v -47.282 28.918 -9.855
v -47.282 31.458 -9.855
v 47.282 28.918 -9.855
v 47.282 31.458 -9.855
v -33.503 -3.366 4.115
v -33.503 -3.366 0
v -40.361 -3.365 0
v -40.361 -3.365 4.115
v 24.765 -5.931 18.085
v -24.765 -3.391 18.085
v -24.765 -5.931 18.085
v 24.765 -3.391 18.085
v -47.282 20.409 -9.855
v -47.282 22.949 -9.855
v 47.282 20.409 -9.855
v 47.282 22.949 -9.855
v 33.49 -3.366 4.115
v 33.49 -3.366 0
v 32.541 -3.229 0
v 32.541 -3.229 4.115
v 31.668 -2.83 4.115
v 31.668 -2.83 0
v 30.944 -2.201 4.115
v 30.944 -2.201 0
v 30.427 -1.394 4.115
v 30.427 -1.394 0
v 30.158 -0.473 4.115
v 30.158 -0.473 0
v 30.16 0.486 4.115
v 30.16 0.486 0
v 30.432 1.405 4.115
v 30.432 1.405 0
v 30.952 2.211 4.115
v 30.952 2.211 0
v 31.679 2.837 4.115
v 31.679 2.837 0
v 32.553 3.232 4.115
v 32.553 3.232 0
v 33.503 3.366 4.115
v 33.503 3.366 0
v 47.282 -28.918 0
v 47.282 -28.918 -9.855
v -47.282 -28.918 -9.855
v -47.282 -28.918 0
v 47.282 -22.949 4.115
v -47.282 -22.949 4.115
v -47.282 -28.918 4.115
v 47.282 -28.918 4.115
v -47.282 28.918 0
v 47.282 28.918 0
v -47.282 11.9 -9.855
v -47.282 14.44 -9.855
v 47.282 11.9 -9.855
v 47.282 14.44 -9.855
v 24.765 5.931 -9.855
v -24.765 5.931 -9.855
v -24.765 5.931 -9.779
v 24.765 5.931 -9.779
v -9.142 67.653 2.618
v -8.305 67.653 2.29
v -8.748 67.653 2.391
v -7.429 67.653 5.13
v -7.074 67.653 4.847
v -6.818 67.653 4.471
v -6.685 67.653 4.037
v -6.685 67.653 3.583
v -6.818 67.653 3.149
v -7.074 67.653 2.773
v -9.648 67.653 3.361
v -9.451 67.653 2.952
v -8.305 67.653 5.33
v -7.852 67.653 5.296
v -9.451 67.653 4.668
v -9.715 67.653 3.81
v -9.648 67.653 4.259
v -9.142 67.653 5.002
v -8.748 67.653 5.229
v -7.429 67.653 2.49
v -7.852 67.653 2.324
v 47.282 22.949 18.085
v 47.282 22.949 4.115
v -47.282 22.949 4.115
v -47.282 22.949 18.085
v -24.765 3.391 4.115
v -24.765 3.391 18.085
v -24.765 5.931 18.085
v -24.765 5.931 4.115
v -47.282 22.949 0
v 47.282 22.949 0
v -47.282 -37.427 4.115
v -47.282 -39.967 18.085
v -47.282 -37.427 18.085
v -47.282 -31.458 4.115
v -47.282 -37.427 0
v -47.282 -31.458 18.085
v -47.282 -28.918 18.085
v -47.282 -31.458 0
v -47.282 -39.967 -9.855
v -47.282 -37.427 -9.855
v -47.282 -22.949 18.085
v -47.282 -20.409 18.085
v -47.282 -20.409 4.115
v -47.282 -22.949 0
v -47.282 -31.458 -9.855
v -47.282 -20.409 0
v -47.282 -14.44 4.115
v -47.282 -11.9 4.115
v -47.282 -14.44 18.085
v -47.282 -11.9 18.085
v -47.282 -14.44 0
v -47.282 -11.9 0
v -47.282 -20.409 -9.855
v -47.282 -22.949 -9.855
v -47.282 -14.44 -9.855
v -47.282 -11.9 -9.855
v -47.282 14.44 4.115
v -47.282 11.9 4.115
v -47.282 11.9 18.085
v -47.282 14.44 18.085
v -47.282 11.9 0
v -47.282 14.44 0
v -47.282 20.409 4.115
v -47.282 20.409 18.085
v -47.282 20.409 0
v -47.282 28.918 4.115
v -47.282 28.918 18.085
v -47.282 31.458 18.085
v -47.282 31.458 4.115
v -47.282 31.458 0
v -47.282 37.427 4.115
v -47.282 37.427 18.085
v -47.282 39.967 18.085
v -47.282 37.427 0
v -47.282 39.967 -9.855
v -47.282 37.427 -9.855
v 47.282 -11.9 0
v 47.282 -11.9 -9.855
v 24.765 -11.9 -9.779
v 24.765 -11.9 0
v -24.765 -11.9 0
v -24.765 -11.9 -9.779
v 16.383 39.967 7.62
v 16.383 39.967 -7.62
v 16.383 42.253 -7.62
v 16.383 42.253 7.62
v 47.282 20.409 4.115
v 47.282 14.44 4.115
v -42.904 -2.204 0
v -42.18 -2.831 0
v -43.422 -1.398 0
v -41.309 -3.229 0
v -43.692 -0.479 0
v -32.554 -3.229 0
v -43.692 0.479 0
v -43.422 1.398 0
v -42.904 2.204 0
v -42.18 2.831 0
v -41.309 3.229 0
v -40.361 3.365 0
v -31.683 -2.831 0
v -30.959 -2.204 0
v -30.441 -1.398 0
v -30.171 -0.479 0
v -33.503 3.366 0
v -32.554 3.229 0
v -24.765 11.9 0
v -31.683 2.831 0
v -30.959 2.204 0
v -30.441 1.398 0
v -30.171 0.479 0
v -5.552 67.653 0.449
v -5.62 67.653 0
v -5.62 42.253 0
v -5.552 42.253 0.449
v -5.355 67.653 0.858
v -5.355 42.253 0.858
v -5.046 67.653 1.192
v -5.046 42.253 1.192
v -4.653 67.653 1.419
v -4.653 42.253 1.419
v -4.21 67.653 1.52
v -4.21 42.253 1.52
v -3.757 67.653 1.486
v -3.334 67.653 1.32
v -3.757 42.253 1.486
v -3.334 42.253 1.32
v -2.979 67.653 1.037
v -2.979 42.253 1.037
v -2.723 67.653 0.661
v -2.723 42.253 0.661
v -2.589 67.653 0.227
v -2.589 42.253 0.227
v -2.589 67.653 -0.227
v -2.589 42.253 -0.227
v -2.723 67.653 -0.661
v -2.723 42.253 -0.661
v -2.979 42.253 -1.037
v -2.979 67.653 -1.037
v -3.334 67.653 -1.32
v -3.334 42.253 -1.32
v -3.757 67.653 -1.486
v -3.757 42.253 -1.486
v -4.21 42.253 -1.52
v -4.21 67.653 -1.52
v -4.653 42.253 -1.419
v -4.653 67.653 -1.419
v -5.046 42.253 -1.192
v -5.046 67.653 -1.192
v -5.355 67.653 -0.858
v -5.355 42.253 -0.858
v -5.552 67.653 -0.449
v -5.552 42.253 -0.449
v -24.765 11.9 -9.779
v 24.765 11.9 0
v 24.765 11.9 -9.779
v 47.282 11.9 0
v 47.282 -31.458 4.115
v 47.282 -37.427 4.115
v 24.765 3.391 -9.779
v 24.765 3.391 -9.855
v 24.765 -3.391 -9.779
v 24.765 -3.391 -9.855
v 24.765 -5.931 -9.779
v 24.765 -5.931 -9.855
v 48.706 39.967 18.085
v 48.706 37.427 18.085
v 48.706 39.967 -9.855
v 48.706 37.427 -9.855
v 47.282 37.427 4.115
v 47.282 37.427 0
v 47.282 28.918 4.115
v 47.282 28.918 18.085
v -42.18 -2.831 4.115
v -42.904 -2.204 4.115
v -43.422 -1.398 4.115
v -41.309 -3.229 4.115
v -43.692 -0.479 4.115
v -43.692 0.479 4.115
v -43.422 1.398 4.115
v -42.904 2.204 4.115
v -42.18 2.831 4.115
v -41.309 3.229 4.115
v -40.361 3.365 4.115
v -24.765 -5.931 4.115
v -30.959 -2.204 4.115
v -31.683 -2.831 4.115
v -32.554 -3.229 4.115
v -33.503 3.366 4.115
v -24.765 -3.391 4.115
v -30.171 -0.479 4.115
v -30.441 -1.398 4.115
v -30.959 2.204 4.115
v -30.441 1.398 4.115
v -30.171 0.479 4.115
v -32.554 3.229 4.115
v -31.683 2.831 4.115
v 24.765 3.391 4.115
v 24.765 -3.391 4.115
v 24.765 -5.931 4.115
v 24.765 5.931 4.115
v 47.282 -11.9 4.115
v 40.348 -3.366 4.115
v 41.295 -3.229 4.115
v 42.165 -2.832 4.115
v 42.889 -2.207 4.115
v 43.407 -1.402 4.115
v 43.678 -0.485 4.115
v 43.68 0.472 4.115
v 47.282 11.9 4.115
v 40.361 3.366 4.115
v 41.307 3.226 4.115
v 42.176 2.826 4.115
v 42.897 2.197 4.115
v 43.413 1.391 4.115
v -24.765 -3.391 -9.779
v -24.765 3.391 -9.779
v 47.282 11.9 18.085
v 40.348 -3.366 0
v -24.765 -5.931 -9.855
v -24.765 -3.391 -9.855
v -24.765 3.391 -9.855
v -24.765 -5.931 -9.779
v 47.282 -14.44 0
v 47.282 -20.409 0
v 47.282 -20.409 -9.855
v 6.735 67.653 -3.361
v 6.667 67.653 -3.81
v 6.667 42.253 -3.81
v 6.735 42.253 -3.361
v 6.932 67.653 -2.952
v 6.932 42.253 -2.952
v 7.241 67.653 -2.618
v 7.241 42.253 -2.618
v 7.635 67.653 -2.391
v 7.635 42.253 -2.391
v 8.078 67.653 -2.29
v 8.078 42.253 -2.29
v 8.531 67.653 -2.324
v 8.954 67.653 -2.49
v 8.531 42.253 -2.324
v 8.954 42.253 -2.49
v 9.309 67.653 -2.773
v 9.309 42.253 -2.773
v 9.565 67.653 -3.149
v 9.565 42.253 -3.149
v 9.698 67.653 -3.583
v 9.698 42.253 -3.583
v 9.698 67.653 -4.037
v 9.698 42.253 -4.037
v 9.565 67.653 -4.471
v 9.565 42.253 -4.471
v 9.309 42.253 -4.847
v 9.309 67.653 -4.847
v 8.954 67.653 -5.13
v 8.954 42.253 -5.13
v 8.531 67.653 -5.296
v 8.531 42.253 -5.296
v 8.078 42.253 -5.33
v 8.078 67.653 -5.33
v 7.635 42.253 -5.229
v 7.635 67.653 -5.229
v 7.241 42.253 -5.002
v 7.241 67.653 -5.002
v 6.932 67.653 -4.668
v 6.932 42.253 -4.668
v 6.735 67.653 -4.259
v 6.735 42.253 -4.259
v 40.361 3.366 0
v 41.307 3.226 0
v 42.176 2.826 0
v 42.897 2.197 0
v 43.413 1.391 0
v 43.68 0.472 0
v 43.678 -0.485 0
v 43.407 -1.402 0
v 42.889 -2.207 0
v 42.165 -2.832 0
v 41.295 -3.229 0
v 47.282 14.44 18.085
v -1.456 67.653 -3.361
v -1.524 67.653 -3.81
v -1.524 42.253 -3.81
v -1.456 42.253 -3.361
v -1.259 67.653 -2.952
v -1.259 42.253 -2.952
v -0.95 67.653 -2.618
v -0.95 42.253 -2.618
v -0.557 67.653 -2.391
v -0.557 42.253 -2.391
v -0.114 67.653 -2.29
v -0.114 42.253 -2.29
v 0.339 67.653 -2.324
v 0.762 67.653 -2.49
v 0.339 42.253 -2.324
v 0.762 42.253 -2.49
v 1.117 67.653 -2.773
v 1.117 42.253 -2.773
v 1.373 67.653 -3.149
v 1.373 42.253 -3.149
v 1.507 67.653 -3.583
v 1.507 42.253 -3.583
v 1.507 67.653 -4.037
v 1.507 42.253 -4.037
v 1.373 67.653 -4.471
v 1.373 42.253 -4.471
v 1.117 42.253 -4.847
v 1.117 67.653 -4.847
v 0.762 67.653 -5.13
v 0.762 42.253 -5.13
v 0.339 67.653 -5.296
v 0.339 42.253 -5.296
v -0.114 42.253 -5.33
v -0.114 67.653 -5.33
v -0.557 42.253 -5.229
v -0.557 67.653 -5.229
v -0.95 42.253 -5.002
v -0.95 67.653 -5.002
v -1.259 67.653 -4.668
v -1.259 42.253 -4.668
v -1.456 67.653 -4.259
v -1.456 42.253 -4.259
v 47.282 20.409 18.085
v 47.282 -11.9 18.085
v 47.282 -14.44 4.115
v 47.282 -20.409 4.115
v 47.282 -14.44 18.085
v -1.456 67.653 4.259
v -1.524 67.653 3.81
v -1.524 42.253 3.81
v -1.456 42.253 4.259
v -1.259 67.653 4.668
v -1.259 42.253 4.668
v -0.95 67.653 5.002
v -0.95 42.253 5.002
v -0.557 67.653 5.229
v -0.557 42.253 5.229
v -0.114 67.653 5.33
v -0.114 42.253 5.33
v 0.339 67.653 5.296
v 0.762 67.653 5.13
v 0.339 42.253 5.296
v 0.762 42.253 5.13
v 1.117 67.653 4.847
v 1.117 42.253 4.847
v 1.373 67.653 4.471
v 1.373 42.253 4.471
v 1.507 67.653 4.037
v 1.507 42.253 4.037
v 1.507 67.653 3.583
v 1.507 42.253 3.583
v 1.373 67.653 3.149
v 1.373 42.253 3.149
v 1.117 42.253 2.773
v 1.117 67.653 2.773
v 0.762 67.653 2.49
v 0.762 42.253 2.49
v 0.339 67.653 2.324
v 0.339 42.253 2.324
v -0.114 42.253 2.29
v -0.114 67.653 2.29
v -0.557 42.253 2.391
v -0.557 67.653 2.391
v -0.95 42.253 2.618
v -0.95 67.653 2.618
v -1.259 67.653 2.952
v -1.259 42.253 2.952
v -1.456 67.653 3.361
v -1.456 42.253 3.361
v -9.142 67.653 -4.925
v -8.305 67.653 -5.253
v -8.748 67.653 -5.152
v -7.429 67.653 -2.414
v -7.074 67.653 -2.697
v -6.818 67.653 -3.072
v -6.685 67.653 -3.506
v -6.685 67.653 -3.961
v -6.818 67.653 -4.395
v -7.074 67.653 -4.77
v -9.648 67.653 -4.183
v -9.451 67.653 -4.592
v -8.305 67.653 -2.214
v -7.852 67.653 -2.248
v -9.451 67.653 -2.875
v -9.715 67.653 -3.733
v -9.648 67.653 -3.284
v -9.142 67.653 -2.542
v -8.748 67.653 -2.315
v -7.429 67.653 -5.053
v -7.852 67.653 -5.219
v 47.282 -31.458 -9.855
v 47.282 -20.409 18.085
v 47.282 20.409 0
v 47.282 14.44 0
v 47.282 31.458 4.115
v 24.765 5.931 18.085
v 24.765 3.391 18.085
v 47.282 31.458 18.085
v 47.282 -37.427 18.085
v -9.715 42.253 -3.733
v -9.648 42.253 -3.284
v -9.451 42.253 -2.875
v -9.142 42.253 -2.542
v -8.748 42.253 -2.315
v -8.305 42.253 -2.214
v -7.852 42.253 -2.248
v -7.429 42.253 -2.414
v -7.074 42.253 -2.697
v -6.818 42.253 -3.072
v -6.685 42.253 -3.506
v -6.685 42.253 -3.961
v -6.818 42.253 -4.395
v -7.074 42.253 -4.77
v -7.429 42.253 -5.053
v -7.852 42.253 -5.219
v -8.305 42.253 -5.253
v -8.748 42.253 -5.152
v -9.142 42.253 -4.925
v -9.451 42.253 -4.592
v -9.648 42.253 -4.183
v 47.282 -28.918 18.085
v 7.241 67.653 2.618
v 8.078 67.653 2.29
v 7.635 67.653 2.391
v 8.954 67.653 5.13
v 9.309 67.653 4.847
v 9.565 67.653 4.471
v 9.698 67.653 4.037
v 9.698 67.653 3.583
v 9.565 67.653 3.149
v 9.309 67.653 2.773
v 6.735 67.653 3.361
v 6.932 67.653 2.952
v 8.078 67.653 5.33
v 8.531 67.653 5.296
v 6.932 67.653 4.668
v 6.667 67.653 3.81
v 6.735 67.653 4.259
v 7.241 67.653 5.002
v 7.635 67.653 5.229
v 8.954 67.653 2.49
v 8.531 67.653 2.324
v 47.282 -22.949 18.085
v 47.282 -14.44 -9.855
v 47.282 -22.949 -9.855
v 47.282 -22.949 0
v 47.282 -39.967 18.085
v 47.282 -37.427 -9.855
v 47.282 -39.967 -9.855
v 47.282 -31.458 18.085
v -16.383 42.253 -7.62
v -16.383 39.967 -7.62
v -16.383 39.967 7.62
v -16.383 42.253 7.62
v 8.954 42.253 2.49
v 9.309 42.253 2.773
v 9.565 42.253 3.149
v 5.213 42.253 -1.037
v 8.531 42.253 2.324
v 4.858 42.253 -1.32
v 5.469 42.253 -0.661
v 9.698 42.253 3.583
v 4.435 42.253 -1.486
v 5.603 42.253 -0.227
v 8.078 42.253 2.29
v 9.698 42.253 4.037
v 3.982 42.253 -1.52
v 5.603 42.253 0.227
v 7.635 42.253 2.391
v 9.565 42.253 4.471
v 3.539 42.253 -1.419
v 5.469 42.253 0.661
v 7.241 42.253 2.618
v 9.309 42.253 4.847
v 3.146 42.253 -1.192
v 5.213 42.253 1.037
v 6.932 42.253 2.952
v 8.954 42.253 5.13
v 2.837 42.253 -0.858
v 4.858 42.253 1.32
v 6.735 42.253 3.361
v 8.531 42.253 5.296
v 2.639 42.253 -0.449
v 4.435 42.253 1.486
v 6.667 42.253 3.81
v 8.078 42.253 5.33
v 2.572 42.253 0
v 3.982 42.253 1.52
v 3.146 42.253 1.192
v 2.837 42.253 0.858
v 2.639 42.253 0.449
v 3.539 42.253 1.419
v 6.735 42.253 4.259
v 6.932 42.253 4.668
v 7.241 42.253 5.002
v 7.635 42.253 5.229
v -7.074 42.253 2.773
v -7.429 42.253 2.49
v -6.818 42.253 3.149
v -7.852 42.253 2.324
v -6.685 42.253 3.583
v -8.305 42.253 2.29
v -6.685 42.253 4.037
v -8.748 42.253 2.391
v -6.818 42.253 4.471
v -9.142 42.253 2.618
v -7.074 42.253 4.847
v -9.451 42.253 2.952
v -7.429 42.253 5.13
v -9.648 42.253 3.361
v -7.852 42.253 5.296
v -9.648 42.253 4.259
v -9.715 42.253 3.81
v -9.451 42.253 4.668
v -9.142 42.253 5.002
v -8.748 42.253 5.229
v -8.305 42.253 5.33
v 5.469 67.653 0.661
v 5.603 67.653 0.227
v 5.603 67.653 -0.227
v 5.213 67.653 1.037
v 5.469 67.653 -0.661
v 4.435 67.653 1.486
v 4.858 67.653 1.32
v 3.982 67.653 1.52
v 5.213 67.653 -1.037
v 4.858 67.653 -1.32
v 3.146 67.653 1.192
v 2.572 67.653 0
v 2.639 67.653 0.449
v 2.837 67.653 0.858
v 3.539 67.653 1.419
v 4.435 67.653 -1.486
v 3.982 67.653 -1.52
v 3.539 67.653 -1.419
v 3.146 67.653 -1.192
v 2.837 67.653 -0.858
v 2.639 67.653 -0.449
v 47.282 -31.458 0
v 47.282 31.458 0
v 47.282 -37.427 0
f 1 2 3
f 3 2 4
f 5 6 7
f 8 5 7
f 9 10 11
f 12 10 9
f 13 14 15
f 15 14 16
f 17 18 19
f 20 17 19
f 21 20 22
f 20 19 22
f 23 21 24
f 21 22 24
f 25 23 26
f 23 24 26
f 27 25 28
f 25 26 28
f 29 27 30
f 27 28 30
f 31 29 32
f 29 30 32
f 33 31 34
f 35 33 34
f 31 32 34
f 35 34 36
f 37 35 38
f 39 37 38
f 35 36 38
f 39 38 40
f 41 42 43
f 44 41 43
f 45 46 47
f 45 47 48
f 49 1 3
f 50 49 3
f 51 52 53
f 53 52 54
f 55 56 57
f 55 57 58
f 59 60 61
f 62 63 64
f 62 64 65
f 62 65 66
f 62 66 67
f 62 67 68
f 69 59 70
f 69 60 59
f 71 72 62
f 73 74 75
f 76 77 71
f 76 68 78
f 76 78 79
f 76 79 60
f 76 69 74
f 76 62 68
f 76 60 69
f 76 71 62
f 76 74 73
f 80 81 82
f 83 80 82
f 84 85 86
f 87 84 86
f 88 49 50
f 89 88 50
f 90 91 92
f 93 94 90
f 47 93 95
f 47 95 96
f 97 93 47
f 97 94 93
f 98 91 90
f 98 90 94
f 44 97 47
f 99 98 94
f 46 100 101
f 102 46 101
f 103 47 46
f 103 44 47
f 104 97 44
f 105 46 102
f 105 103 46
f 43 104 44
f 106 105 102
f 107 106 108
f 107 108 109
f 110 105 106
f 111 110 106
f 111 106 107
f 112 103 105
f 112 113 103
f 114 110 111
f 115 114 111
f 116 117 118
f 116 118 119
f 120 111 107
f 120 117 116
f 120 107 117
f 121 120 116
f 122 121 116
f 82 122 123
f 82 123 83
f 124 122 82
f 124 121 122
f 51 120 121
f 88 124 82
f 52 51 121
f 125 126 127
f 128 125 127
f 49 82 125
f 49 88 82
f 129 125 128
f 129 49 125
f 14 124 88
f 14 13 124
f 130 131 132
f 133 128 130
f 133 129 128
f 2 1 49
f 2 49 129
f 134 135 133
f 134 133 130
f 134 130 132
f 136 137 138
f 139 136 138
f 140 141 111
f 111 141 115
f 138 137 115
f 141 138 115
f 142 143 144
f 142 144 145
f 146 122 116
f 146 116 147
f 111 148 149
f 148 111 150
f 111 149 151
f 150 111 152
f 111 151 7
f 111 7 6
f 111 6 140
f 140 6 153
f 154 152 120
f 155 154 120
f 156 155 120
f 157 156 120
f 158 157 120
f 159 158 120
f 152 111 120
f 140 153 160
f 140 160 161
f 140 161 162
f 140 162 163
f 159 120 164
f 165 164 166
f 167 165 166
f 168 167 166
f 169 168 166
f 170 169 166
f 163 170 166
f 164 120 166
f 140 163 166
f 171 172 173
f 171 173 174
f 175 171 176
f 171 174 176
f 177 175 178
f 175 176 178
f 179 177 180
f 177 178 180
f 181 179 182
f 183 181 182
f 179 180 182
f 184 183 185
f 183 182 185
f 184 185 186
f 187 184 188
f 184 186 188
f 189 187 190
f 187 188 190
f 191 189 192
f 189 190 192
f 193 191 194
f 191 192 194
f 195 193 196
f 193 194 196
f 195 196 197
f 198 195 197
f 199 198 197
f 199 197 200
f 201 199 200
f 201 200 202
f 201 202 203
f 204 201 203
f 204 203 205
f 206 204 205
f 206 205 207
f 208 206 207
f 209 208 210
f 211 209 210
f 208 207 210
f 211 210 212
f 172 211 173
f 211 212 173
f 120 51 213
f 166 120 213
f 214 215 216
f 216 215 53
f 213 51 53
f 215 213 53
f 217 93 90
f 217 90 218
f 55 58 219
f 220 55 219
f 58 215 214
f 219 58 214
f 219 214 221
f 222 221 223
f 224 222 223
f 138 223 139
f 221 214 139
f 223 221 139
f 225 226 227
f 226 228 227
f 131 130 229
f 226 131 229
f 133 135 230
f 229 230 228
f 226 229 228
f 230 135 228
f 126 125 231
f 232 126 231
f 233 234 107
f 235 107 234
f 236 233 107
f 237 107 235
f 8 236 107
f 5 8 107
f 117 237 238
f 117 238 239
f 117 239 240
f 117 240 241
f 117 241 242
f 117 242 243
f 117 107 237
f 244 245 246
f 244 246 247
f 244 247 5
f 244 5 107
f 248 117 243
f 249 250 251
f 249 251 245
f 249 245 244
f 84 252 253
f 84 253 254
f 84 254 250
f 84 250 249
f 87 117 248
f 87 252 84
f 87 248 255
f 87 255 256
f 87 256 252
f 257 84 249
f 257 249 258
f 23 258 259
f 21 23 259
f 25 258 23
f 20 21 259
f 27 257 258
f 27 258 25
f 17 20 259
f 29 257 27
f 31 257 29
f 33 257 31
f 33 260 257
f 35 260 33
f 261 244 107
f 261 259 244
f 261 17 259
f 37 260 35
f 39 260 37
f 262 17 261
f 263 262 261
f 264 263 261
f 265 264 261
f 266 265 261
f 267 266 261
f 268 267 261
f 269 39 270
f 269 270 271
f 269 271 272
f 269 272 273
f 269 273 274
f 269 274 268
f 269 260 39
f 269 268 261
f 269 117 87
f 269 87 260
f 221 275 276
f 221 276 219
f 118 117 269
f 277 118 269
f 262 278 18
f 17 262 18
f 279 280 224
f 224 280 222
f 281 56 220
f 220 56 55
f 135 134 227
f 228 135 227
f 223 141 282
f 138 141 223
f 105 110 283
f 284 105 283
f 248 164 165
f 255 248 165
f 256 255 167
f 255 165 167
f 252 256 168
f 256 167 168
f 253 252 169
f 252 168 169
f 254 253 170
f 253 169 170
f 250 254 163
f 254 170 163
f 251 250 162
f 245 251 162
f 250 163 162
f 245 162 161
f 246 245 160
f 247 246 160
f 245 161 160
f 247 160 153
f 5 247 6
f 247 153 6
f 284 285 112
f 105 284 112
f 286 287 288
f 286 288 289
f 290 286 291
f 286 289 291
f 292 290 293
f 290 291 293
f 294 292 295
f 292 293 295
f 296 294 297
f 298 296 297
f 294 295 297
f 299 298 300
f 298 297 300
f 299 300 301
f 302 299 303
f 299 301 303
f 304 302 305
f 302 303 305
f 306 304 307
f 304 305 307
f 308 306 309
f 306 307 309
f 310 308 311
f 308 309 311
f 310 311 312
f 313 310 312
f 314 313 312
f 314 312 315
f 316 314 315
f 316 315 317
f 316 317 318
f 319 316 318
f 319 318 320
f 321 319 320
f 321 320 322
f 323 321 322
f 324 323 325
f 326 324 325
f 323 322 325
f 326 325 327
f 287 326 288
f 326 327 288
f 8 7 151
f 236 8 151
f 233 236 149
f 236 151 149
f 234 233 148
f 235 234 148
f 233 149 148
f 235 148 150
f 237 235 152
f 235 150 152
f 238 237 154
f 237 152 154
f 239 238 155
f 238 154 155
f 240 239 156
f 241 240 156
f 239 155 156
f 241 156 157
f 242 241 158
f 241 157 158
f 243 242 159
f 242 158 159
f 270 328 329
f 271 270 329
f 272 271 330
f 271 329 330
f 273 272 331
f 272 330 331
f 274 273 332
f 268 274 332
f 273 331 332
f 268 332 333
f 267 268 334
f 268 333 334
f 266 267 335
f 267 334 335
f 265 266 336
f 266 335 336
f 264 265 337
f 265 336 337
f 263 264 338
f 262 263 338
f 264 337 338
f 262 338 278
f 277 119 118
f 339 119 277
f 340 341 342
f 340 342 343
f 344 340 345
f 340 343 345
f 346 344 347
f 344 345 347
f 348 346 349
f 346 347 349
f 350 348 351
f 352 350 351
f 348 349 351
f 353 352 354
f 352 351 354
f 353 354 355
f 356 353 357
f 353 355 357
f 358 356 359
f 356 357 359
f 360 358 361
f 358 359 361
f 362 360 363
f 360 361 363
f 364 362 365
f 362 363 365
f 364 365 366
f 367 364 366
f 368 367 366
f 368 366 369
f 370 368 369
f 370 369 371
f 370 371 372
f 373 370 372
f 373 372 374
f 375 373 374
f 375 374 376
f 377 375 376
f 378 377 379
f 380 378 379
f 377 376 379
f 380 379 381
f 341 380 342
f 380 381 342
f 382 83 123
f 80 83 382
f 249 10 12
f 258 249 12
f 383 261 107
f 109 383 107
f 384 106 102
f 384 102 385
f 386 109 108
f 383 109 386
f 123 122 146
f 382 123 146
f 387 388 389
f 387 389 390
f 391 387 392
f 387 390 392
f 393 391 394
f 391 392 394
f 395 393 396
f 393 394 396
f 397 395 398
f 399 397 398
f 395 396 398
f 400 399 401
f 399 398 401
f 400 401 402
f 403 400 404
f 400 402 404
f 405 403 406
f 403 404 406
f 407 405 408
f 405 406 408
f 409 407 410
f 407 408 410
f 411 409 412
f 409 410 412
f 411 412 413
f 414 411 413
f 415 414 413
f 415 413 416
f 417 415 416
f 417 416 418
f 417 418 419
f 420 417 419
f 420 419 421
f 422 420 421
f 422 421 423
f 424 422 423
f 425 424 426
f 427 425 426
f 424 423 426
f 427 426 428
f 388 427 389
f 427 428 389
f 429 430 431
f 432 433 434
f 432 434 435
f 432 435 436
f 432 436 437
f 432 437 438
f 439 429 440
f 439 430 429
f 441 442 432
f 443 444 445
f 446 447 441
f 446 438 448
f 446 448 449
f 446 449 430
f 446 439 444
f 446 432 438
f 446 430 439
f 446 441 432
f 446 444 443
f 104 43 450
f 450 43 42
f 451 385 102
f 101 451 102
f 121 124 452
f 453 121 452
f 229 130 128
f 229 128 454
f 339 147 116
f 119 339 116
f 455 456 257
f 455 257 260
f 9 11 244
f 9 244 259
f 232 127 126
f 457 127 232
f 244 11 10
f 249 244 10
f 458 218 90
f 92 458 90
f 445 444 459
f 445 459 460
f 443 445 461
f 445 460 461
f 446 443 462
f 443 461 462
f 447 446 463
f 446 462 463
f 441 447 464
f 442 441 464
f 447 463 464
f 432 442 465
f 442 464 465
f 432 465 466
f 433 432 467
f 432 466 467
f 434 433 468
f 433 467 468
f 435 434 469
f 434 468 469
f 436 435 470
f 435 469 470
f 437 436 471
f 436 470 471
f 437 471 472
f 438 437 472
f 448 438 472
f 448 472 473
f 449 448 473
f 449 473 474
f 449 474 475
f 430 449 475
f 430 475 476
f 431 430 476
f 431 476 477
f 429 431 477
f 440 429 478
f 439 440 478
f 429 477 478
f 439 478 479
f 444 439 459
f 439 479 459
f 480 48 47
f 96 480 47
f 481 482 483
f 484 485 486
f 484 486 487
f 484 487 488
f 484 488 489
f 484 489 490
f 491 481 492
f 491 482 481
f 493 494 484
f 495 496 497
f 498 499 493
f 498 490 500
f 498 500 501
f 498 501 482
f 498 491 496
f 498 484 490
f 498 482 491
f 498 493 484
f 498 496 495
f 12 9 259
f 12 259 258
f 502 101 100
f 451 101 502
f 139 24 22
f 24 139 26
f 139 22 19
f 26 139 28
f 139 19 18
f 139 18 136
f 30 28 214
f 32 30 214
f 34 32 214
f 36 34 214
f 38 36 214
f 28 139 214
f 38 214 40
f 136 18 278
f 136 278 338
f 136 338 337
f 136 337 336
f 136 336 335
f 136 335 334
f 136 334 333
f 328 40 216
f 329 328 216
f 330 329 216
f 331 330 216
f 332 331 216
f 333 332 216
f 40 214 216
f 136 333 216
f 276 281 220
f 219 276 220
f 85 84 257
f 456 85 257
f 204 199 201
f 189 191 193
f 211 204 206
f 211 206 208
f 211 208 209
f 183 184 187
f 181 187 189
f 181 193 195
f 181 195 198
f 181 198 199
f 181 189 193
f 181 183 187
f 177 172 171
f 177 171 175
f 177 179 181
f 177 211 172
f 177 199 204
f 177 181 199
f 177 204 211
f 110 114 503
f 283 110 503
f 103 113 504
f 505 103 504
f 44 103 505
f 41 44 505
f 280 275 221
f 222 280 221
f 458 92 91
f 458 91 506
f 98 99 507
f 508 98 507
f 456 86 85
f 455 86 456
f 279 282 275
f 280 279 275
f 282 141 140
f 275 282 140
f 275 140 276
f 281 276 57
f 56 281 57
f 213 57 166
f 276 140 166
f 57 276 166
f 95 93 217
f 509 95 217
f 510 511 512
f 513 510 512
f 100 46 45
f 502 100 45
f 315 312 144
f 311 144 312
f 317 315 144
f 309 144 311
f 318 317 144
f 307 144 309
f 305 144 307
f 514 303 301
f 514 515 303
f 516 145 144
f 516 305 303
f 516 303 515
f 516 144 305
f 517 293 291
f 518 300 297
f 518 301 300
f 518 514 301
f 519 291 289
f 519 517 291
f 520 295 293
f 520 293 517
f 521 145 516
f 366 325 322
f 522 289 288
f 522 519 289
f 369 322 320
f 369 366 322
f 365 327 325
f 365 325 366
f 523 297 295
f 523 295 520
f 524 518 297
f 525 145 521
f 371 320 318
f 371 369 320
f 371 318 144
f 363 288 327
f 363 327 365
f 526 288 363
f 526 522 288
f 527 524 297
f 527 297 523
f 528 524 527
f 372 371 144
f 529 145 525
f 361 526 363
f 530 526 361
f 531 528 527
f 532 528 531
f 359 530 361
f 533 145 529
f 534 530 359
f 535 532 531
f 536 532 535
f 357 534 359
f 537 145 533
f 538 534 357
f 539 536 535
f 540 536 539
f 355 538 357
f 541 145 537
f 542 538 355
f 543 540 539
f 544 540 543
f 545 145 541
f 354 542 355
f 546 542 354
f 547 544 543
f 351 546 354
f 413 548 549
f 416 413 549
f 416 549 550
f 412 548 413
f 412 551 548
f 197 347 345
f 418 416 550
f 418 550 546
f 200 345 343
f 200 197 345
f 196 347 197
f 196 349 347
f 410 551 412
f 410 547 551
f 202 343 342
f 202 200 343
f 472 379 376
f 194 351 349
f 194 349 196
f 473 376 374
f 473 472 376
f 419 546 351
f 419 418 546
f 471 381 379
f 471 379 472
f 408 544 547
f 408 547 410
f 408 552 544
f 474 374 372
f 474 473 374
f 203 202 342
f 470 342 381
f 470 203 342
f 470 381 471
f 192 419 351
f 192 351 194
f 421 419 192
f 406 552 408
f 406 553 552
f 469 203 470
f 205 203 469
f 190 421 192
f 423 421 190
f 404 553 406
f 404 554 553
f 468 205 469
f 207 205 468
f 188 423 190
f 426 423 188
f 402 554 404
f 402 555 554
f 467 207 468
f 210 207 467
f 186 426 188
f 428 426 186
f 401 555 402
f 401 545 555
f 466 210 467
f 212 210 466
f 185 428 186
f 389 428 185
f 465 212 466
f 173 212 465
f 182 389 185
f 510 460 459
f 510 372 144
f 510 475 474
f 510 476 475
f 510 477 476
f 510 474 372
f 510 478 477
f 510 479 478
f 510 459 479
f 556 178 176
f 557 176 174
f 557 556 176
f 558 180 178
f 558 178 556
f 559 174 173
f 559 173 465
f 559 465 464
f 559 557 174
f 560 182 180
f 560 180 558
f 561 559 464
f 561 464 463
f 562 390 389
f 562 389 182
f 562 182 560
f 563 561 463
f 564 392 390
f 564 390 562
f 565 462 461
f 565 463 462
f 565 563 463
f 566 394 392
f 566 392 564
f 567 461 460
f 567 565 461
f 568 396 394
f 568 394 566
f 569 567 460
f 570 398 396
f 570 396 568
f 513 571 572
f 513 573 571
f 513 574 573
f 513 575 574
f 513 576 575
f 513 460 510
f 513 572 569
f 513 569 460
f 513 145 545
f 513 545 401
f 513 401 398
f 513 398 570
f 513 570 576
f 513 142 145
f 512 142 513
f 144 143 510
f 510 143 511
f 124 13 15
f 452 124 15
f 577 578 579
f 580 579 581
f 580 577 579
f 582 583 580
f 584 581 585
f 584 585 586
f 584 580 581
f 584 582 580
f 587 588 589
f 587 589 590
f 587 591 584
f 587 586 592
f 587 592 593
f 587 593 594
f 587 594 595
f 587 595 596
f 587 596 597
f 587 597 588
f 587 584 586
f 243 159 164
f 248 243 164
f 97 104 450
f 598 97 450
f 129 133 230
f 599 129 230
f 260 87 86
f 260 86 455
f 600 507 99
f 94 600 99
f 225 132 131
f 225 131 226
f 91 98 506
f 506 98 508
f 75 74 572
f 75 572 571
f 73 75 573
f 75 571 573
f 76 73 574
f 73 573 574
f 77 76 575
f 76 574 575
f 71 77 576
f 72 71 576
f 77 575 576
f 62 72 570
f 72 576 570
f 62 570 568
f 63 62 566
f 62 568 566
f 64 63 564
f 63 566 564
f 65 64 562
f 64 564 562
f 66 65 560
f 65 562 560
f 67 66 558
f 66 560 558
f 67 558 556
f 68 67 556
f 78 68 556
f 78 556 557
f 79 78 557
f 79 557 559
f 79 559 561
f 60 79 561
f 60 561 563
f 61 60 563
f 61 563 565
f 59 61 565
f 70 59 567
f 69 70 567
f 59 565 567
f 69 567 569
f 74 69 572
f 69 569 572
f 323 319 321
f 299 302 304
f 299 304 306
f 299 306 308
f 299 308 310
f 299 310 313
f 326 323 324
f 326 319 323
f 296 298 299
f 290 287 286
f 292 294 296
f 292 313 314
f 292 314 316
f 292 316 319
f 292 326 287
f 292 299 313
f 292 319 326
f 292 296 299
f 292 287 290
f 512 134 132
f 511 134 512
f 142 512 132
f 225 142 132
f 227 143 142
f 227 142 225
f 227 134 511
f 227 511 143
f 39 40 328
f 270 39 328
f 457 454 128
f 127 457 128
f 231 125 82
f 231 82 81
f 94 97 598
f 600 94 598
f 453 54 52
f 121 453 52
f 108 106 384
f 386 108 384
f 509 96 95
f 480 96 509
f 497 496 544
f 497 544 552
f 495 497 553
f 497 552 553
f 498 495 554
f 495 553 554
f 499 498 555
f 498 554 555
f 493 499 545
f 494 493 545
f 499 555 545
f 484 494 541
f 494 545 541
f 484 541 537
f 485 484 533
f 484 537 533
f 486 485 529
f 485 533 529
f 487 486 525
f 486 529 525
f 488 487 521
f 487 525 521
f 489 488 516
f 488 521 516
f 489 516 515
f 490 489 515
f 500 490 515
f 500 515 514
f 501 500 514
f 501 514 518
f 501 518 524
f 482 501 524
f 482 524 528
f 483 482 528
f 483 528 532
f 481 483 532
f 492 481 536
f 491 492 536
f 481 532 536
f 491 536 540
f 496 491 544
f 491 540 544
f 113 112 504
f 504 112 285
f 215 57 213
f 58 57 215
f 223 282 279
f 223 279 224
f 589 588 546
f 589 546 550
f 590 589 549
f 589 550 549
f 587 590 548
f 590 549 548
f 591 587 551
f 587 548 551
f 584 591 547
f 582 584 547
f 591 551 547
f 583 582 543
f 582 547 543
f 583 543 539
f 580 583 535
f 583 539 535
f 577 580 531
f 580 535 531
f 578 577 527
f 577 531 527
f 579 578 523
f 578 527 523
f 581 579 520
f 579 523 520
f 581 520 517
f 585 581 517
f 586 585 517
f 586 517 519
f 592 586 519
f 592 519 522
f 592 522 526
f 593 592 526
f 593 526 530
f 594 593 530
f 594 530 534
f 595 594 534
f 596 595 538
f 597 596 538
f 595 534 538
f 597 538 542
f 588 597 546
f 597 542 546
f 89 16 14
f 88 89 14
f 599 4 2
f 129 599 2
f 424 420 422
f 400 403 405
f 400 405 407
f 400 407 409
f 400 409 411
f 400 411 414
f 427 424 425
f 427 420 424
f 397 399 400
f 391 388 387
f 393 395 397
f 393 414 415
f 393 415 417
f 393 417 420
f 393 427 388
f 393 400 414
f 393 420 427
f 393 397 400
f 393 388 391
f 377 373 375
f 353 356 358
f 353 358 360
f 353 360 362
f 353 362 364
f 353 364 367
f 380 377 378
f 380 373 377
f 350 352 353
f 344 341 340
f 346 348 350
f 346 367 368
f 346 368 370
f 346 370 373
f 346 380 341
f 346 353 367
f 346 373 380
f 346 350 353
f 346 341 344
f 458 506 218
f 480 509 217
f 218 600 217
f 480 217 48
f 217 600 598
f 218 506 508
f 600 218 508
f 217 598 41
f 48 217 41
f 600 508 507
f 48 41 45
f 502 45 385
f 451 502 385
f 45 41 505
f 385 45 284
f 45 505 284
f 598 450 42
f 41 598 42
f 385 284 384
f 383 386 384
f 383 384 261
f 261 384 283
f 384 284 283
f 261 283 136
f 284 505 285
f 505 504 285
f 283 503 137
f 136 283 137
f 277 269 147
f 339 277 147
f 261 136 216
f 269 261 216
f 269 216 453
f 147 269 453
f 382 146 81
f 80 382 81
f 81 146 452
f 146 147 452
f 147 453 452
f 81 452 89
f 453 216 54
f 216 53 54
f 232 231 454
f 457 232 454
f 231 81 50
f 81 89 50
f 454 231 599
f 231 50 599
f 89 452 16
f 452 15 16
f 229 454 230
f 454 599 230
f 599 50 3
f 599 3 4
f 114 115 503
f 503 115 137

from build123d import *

# Parameters (mm, degrees)
F0_W     = 94.5642
F0_H     = 79.9338
F1_DEPTH = 4.1148
F2_W     = 22.5171
F2_H     = 2.54
F2_W_2   = 49.53
F2_W_3   = 1.4234517733
F3_DEPTH = 13.97
F4_W     = 32.766
F4_H     = 15.24
F5_DEPTH = 2.286
F7_W     = 49.53
F7_H     = 5.969
F7_H_2   = 2.54
F7_H_3   = 6.7818
F8_DEPTH = 9.779
F6_R     = 1.524
F9_DEPTH = 25.4


with BuildPart() as f1:
    # F0 (on Top) → F1 (new body)
    with BuildSketch(Plane.XY):
        Rectangle(F0_W, F0_H)
        with BuildLine():
            Line((-40.3606, 3.3655), (-33.5026, 3.3655))
            ThreePointArc((-33.5026, 3.3655), (-30.1371, 0), (-33.5026, -3.3655))
            Line((-33.5026, -3.3655), (-40.3606, -3.3655))
            ThreePointArc((-40.3606, -3.3655), (-43.7261, 0), (-40.3606, 3.3655))
        make_face(mode=Mode.SUBTRACT)
        with BuildLine():
            Line((33.5026, 3.3655), (40.3606, 3.3655))
            ThreePointArc((40.3606, 3.3655), (43.7134059906, -0.0063380302), (40.3479, -3.3655))
            Line((40.3479, -3.3655), (33.4899, -3.3655))
            ThreePointArc((33.4899, -3.3655), (30.1243940094, 0.0063619924), (33.5026, 3.3655))
        make_face(mode=Mode.SUBTRACT)
    extrude(amount=F1_DEPTH)

    # F2 (on face) → F3 (join, symmetric)
    with BuildSketch(Plane.XY.offset(4.1148)):
        with Locations((36.02355, -38.6969)):
            Rectangle(F2_W, F2_H)
        with Locations((-36.02355, 38.6969)):
            Rectangle(F2_W, F2_H)
        with Locations((-36.02355, -38.6969)):
            Rectangle(F2_W, F2_H)
        with Locations((0, 38.6969)):
            Rectangle(F2_W_2, F2_H)
        with Locations((36.02355, 30.1879)):
            Rectangle(F2_W, F2_H)
        with Locations((36.02355, 21.6789)):
            Rectangle(F2_W, F2_H)
        with Locations((36.02355, 13.1699)):
            Rectangle(F2_W, F2_H)
        with Locations((36.02355, -13.1699)):
            Rectangle(F2_W, F2_H)
        with Locations((36.02355, -21.6789)):
            Rectangle(F2_W, F2_H)
        with Locations((36.02355, -30.1879)):
            Rectangle(F2_W, F2_H)
        with Locations((0, -38.6969)):
            Rectangle(F2_W_2, F2_H)
        with Locations((-36.02355, 30.1879)):
            Rectangle(F2_W, F2_H)
        with Locations((-36.02355, 21.6789)):
            Rectangle(F2_W, F2_H)
        with Locations((-36.02355, 13.1699)):
            Rectangle(F2_W, F2_H)
        with Locations((-36.02355, -13.1699)):
            Rectangle(F2_W, F2_H)
        with Locations((-36.02355, -21.6789)):
            Rectangle(F2_W, F2_H)
        with Locations((-36.02355, -30.1879)):
            Rectangle(F2_W, F2_H)
        with Locations((0, 30.1879)):
            Rectangle(F2_W_2, F2_H)
        with Locations((0, 21.6789)):
            Rectangle(F2_W_2, F2_H)
        with Locations((0, 13.1699)):
            Rectangle(F2_W_2, F2_H)
        with Locations((0, -13.1699)):
            Rectangle(F2_W_2, F2_H)
        with Locations((0, -21.6789)):
            Rectangle(F2_W_2, F2_H)
        with Locations((0, -30.1879)):
            Rectangle(F2_W_2, F2_H)
        with Locations((0, 4.6609)):
            Rectangle(F2_W_2, F2_H)
        with Locations((0, -4.6609)):
            Rectangle(F2_W_2, F2_H)
        with Locations((47.9938258867, 38.6969)):
            Rectangle(F2_W_3, F2_H)
        with Locations((36.02355, 38.6969)):
            Rectangle(F2_W, F2_H)
    extrude(amount=F3_DEPTH, both=True)

    # F4 (on face) → F5 (join)
    with BuildSketch(Plane(origin=(0, 39.9669, 0), x_dir=(-1, 0, 0), z_dir=(0, 1, 0))):
        Rectangle(F4_W, F4_H)
    extrude(amount=F5_DEPTH)

    # F7 (on face) → F8 (join)
    with BuildSketch(Plane(origin=(0, 0, 0), x_dir=(1, 0, 0), z_dir=(0, 0, -1))):
        with Locations((0, 8.9154)):
            Rectangle(F7_W, F7_H)
        with Locations((0, 4.6609)):
            Rectangle(F7_W, F7_H_2)
        Rectangle(F7_W, F7_H_3)
        with Locations((0, -4.6609)):
            Rectangle(F7_W, F7_H_2)
        with Locations((0, -8.9154)):
            Rectangle(F7_W, F7_H)
    extrude(amount=F8_DEPTH)

    # F6 (on face) → F9 (join)
    with BuildSketch(Plane(origin=(0, 42.2529, 0), x_dir=(-1, 0, 0), z_dir=(0, 1, 0))):
        with Locations((-8.1915, 3.81)):
            Circle(F6_R)
        with Locations((8.1915, 3.81)):
            Circle(F6_R)
        with Locations((4.09575, 0)):
            Circle(F6_R)
        with Locations((-4.09575, 0)):
            Circle(F6_R)
        with Locations((8.1915, -3.7334442604)):
            Circle(F6_R)
        with Locations((-8.1915, -3.81)):
            Circle(F6_R)
        with Locations((0, 3.81)):
            Circle(F6_R)
        with Locations((0, -3.81)):
            Circle(F6_R)
    extrude(amount=F9_DEPTH)


solid = f1.part
